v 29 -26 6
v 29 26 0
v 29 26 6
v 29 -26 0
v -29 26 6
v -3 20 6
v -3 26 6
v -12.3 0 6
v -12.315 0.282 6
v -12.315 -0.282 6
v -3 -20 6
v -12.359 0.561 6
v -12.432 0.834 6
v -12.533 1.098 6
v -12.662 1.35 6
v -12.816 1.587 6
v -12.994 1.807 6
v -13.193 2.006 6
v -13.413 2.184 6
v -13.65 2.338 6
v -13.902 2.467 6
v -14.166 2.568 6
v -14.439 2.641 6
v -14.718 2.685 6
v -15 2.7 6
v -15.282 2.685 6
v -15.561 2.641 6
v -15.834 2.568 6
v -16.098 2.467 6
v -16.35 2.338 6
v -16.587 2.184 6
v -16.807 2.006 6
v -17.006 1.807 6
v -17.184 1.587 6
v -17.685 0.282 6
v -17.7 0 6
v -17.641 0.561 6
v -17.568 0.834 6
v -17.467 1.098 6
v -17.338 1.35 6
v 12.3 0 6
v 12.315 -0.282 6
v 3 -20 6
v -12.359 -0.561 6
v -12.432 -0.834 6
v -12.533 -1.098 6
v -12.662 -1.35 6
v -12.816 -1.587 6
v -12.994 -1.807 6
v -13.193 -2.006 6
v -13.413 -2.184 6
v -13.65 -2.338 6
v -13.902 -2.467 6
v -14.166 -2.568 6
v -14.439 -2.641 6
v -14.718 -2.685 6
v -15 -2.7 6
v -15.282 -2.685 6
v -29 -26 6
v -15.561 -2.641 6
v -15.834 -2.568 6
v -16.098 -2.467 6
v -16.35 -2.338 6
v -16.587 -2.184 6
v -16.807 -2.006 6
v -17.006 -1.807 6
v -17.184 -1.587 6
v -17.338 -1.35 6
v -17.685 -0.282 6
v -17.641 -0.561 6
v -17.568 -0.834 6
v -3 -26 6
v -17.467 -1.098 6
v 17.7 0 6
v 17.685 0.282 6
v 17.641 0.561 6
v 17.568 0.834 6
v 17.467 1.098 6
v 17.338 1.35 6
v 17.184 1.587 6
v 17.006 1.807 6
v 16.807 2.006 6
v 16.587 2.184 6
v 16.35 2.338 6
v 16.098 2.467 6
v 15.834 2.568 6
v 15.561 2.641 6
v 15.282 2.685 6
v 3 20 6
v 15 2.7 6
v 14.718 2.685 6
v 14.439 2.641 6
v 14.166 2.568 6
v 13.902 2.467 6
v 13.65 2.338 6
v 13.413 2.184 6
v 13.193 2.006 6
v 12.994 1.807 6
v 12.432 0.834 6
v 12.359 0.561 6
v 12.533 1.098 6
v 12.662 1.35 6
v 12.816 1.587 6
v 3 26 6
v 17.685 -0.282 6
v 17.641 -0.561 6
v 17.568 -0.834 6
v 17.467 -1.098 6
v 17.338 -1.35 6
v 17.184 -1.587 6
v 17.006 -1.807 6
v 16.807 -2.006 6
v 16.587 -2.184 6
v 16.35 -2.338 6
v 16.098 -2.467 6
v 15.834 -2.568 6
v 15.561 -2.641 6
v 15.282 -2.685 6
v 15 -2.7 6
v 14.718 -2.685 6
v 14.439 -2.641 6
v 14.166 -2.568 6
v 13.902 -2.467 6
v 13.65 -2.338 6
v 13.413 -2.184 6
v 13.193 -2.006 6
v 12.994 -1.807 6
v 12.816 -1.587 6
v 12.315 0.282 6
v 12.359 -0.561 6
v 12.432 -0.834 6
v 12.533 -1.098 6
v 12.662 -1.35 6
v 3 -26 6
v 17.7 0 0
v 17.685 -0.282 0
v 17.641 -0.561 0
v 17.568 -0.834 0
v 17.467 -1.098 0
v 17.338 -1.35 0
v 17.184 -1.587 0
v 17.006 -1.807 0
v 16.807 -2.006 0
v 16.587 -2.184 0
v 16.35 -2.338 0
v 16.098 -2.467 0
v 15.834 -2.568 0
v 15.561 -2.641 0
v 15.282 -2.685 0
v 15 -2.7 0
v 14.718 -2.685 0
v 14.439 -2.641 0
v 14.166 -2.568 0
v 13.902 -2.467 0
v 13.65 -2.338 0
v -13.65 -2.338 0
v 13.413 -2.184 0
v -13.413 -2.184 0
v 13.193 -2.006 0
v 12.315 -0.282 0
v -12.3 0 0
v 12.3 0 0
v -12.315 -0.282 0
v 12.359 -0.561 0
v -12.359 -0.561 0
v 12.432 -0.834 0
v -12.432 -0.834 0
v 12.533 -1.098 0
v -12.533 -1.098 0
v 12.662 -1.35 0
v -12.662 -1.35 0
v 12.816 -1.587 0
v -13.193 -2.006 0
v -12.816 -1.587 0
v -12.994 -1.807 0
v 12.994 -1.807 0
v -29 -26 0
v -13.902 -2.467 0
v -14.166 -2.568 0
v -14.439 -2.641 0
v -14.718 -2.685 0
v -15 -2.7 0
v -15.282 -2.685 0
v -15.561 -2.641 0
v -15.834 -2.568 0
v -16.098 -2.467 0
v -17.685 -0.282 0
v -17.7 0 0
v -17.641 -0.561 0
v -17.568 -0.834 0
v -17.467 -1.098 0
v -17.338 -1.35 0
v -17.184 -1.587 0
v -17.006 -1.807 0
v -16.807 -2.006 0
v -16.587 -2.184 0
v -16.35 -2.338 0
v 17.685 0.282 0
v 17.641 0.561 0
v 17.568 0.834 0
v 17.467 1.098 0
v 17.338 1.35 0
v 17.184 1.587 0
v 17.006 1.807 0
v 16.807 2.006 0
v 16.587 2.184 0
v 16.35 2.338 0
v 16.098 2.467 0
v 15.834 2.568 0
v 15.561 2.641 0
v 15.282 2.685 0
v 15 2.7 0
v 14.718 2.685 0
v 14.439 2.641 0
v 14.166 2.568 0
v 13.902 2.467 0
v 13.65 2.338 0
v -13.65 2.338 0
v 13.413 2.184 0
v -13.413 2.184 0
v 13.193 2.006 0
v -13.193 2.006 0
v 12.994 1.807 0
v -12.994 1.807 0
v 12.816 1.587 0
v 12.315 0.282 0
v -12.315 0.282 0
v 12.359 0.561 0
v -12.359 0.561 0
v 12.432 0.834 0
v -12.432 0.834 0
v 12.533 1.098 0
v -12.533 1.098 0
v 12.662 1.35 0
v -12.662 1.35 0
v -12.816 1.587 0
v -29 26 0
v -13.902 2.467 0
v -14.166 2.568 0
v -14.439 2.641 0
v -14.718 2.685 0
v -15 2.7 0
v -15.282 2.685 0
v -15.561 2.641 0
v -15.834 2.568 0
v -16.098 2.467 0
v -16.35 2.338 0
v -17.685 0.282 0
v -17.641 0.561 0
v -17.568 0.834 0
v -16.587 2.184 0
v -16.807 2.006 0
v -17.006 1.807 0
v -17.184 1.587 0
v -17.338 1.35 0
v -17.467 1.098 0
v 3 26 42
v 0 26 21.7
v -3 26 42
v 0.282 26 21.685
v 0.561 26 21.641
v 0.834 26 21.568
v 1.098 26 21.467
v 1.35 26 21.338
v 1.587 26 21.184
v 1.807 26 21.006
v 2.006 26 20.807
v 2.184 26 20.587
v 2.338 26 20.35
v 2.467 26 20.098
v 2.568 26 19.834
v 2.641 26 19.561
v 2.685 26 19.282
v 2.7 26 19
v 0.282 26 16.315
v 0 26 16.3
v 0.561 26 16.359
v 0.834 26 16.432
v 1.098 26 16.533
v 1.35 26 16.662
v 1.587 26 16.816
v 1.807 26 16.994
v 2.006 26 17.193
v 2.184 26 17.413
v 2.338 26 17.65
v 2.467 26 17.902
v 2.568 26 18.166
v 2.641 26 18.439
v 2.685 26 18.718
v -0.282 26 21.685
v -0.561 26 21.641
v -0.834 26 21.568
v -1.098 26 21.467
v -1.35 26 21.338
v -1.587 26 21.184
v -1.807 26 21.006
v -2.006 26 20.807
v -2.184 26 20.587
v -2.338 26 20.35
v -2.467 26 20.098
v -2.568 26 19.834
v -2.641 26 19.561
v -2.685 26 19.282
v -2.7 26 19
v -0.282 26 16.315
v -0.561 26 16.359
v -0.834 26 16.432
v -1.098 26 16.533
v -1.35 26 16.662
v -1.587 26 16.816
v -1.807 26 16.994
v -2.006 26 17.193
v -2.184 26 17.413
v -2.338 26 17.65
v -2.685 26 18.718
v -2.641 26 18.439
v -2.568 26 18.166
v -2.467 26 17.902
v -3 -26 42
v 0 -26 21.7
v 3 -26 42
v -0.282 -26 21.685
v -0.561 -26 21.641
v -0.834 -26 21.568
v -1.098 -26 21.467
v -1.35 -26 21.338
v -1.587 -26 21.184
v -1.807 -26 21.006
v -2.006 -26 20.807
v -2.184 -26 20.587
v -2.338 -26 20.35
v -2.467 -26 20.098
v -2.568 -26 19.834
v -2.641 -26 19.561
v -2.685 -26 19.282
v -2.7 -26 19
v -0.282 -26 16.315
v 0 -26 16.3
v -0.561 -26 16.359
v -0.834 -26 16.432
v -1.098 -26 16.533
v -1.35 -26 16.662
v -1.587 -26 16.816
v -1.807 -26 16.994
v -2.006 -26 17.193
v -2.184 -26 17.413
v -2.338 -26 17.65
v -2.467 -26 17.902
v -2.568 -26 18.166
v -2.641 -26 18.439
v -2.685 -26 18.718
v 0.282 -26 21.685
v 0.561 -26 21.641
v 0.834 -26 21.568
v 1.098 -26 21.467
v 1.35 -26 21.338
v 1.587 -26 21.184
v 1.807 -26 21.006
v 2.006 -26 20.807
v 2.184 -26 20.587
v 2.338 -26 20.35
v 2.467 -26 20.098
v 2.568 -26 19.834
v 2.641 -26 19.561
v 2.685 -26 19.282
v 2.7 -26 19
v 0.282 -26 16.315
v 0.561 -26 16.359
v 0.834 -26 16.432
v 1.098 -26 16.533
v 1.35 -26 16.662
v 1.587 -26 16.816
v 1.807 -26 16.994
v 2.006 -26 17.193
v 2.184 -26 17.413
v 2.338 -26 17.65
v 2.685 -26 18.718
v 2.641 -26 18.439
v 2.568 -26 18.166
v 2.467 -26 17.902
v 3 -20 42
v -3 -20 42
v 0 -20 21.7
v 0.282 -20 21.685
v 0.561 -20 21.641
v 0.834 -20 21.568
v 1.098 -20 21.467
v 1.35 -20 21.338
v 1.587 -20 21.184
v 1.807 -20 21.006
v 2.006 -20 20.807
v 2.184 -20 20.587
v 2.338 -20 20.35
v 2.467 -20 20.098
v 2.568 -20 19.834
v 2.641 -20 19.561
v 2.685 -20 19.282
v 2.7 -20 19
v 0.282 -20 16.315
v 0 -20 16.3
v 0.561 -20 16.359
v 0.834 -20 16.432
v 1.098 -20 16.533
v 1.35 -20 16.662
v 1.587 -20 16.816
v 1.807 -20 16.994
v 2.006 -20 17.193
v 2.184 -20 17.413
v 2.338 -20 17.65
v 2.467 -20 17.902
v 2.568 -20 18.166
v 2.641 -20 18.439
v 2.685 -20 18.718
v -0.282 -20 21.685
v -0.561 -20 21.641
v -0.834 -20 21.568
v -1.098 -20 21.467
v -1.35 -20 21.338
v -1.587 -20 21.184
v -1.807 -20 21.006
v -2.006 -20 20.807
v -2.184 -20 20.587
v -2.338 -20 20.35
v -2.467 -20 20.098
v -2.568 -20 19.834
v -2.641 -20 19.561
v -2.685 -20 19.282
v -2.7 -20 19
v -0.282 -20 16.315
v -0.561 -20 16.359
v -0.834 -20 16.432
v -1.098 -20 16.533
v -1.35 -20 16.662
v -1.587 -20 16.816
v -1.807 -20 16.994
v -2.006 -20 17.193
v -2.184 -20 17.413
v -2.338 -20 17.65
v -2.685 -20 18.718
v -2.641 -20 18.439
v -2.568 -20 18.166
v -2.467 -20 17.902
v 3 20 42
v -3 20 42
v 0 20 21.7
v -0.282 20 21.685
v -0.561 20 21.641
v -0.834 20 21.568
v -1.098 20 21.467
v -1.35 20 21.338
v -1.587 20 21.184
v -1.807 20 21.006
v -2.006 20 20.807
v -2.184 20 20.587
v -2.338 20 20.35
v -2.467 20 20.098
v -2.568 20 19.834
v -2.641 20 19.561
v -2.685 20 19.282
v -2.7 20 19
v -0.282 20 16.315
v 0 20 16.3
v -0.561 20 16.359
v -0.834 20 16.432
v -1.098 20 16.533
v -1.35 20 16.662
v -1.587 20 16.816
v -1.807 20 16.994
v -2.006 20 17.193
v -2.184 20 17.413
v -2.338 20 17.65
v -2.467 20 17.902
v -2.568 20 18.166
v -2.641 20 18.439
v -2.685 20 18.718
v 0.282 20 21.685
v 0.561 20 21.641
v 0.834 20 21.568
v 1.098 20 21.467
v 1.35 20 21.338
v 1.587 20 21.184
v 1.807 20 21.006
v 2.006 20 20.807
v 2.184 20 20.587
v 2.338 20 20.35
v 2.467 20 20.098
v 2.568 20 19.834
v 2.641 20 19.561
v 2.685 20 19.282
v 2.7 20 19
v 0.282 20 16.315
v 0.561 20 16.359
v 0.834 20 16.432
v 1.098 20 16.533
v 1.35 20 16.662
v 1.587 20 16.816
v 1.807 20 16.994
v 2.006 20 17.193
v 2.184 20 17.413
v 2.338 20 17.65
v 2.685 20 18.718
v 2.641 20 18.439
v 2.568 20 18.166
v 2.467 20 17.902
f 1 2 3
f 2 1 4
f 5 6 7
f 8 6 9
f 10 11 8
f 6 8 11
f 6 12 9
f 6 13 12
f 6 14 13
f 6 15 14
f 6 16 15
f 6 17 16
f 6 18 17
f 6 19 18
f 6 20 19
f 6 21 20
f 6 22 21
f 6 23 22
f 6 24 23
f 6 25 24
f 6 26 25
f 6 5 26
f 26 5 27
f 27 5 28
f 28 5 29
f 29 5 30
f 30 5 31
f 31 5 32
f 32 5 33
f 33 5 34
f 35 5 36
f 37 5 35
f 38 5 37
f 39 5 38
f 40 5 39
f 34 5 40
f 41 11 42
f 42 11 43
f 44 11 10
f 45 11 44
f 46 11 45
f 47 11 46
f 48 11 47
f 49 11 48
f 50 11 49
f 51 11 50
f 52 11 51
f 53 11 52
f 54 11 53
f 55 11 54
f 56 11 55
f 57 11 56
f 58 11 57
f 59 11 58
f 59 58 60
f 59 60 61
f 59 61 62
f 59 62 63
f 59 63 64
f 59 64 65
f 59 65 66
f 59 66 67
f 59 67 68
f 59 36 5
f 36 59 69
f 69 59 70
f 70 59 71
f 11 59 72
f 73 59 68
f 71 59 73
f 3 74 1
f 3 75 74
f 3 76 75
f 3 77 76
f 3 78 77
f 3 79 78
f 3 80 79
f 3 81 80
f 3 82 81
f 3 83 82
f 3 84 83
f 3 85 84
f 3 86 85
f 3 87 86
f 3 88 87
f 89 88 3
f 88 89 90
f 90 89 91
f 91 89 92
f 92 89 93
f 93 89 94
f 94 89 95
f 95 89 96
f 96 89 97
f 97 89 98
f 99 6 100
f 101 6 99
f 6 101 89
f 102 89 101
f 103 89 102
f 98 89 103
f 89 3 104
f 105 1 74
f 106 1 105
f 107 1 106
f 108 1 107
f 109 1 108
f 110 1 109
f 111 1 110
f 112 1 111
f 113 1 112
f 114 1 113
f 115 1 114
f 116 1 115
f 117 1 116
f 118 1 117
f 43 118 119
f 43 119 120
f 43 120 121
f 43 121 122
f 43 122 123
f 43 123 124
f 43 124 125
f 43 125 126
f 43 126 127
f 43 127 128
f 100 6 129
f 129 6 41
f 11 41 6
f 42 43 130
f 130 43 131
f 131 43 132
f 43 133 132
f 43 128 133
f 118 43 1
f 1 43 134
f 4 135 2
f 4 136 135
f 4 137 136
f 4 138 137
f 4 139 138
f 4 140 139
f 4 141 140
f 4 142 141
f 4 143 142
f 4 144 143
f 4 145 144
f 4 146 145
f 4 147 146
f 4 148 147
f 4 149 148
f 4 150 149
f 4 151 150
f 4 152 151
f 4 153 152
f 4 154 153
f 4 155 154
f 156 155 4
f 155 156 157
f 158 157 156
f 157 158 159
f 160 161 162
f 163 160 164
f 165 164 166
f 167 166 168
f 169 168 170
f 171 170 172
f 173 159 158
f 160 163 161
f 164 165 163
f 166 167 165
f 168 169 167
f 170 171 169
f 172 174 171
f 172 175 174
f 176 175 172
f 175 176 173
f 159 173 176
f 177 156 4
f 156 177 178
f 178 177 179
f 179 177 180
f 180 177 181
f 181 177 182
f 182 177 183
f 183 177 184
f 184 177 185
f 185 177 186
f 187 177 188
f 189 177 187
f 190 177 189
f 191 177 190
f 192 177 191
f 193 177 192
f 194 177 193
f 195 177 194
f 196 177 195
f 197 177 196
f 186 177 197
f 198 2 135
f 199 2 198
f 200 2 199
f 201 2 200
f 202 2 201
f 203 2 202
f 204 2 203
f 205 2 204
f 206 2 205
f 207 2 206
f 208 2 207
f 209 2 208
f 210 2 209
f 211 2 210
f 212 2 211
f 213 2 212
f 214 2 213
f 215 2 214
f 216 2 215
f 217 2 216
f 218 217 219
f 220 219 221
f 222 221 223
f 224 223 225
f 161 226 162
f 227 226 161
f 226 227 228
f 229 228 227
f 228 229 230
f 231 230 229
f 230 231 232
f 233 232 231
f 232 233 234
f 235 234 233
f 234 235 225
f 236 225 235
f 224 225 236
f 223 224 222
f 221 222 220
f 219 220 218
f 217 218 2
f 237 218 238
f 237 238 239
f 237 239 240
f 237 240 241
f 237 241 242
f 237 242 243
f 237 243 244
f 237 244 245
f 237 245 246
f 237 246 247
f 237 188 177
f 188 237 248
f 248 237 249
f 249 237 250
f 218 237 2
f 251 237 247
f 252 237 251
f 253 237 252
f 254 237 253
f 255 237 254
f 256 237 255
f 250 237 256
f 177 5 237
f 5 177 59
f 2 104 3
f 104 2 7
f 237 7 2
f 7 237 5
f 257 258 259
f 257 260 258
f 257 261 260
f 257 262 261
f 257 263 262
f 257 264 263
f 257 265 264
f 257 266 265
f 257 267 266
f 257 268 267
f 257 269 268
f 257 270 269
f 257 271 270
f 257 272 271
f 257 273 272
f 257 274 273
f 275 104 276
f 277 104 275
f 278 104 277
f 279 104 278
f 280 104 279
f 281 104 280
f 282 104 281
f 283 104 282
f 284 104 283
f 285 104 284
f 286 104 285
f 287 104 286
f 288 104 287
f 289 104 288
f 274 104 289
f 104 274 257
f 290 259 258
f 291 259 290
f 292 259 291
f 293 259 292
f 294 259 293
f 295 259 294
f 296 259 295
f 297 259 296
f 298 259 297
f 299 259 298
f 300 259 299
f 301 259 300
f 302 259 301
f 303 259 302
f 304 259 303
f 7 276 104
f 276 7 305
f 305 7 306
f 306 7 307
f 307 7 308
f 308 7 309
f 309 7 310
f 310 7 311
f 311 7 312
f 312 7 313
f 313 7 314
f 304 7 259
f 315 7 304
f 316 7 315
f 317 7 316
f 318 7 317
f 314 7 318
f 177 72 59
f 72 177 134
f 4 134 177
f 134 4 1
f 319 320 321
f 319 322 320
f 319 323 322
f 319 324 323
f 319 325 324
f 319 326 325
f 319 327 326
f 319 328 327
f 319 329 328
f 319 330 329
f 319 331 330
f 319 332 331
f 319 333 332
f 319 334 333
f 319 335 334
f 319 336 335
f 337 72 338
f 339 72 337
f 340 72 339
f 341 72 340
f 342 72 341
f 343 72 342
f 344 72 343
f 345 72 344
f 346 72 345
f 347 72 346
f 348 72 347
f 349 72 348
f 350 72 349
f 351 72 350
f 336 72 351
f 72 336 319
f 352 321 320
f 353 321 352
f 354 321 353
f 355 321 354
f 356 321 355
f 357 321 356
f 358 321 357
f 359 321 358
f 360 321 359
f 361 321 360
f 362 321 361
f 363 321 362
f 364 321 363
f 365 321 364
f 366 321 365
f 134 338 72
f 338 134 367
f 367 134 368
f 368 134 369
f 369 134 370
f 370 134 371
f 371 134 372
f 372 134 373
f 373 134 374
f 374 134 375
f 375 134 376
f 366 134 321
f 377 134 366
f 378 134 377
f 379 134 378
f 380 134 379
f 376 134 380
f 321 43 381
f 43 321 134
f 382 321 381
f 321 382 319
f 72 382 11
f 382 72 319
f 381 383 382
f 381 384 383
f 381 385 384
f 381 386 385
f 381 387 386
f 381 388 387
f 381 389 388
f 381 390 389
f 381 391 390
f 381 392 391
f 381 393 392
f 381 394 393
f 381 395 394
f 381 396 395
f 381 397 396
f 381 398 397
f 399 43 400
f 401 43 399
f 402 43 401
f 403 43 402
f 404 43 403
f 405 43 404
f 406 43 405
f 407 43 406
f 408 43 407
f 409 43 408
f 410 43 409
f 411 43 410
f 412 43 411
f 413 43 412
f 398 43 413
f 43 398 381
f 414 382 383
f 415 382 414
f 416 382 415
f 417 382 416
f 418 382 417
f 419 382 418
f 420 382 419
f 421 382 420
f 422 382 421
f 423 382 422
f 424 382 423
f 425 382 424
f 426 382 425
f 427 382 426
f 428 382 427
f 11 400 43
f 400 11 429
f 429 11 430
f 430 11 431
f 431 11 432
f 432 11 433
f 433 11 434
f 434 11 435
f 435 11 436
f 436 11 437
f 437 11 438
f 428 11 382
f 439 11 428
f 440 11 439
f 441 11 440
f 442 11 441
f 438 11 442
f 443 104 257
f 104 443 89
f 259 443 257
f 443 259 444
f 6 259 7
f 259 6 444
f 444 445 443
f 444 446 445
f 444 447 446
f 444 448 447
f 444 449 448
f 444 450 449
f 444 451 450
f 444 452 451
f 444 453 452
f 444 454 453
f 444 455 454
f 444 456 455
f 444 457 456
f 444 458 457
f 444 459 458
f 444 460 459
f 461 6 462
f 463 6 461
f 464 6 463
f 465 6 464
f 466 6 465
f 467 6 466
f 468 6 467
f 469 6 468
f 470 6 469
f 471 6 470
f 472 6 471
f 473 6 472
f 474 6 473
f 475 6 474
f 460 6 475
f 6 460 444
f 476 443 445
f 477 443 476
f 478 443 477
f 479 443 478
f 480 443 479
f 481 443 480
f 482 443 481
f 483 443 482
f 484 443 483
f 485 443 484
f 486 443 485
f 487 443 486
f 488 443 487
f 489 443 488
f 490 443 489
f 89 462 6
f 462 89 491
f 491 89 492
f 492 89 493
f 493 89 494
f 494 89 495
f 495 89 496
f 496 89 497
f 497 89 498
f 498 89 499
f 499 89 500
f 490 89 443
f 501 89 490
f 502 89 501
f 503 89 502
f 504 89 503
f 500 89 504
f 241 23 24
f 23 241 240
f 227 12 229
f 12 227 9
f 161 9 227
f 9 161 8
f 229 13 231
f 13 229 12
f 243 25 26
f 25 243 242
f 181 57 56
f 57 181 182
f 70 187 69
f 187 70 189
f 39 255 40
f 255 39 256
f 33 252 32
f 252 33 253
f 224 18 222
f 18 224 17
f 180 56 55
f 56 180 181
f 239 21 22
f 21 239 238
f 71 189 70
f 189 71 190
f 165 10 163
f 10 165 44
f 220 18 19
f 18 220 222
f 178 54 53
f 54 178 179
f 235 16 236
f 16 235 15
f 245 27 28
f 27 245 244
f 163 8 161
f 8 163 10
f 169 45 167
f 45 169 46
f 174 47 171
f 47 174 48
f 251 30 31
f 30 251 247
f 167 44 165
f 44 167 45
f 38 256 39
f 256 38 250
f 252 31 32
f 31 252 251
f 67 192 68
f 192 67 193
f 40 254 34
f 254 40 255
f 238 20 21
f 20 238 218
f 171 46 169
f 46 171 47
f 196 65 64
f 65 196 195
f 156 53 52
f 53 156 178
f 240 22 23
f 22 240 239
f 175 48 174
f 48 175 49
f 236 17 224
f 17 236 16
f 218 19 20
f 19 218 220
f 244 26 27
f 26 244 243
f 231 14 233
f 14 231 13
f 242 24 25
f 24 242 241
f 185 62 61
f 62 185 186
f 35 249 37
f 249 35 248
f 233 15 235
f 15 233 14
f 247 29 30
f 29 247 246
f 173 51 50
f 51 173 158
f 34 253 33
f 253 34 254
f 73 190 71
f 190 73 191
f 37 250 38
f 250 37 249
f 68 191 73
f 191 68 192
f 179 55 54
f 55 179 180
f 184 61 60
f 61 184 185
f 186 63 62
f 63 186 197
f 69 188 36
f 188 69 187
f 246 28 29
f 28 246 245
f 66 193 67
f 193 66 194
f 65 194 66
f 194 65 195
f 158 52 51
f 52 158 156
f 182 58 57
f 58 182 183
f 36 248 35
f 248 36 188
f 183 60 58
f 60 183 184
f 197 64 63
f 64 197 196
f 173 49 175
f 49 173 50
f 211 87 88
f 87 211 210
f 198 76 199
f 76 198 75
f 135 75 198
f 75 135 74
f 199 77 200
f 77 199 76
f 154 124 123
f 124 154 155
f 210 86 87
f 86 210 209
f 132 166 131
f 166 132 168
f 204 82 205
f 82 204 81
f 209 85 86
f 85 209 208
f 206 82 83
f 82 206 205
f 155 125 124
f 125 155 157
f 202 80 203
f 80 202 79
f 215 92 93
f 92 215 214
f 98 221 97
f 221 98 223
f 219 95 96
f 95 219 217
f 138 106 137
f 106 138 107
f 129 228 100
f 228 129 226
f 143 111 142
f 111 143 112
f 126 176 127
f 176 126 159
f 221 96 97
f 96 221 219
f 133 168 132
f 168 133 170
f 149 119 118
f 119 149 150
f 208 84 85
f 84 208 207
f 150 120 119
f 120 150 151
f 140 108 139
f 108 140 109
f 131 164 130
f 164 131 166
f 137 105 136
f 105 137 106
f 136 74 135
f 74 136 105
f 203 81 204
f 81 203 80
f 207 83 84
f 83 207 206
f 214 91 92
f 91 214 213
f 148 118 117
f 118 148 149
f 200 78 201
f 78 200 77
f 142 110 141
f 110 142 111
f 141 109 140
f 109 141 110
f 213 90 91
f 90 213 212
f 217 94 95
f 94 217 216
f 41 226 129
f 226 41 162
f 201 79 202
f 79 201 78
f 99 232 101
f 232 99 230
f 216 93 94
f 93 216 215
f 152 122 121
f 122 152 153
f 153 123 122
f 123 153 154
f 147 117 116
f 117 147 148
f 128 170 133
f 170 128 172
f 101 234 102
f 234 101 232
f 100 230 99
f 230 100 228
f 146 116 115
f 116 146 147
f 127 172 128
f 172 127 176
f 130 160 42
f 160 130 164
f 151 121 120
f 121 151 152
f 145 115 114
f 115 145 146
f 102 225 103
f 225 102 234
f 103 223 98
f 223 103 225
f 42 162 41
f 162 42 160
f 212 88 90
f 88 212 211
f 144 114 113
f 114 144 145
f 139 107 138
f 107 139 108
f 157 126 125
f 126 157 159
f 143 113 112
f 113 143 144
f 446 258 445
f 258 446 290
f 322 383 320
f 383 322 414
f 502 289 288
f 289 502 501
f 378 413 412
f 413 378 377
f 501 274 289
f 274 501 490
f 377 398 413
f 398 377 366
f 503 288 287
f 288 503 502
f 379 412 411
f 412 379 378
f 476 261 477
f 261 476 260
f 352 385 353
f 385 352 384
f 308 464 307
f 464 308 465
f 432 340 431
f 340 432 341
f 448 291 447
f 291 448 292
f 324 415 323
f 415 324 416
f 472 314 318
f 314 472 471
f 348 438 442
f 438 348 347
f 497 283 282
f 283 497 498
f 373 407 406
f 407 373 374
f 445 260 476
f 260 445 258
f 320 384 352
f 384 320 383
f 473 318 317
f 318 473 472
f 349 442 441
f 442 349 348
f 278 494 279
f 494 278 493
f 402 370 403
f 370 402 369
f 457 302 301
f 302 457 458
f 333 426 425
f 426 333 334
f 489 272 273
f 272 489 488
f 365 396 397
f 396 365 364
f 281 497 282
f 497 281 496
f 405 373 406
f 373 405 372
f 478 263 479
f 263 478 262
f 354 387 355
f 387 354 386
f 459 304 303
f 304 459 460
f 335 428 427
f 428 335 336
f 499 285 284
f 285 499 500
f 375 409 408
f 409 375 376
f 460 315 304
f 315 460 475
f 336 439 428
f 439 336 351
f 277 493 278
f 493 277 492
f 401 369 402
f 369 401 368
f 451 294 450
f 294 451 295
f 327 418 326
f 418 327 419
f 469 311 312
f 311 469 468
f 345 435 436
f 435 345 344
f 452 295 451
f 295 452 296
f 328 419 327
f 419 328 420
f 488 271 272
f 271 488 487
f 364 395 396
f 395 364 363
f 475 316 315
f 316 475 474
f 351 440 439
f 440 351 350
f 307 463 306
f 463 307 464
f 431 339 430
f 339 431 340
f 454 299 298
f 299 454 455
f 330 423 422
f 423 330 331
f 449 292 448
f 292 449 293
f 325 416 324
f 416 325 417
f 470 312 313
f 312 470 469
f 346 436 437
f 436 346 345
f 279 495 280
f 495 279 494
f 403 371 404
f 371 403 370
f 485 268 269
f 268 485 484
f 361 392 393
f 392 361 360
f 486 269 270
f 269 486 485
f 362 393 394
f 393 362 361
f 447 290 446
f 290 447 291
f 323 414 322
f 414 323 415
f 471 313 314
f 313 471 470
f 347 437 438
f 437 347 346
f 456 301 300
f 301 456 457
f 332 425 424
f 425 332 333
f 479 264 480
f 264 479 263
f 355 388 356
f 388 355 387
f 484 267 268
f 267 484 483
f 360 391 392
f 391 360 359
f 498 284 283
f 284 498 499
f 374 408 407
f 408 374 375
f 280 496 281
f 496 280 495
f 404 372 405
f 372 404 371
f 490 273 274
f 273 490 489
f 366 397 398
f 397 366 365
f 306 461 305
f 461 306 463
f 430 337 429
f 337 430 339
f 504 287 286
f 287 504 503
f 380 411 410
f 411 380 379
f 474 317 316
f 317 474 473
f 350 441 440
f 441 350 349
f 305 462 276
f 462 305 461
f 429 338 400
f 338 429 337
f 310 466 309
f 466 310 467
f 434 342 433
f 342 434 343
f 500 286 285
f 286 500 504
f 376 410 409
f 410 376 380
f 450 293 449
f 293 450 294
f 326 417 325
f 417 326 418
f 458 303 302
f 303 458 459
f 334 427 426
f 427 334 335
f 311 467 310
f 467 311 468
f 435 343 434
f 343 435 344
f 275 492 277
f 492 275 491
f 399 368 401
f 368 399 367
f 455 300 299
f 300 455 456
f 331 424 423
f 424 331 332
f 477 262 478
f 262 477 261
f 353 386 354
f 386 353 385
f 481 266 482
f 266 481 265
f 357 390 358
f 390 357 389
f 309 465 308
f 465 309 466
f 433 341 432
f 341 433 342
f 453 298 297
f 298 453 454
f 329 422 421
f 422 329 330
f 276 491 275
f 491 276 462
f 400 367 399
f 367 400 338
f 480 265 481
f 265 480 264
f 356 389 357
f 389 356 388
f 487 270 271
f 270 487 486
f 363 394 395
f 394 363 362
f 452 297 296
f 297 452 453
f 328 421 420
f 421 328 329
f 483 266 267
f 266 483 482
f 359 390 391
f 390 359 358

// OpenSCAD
// Clevis mounting bracket for M5 pin.
$fn = 60;
eps = 0.02;
opening = 40;
ear_h = 38;
base_l = 58;
base_w = opening + 12;
base_t = 6;
ear_t = 6;
difference() {
    union() {
        translate([-base_l / 2, -base_w / 2, 0]) cube([base_l, base_w, base_t]);
        translate([-ear_t / 2, -base_w / 2, base_t - 2]) cube([ear_t, ear_t, ear_h]);
        translate([-ear_t / 2, base_w / 2 - ear_t, base_t - 2]) cube([ear_t, ear_t, ear_h]);
    }
    for (x = [-15, 15]) translate([x, 0, -eps]) cylinder(d = 5.4, h = base_t + 2 * eps);
    translate([0, -base_w / 2 - eps, ear_h / 2]) rotate([-90, 0, 0]) cylinder(d = 5.4, h = base_w + 2 * eps);
}
